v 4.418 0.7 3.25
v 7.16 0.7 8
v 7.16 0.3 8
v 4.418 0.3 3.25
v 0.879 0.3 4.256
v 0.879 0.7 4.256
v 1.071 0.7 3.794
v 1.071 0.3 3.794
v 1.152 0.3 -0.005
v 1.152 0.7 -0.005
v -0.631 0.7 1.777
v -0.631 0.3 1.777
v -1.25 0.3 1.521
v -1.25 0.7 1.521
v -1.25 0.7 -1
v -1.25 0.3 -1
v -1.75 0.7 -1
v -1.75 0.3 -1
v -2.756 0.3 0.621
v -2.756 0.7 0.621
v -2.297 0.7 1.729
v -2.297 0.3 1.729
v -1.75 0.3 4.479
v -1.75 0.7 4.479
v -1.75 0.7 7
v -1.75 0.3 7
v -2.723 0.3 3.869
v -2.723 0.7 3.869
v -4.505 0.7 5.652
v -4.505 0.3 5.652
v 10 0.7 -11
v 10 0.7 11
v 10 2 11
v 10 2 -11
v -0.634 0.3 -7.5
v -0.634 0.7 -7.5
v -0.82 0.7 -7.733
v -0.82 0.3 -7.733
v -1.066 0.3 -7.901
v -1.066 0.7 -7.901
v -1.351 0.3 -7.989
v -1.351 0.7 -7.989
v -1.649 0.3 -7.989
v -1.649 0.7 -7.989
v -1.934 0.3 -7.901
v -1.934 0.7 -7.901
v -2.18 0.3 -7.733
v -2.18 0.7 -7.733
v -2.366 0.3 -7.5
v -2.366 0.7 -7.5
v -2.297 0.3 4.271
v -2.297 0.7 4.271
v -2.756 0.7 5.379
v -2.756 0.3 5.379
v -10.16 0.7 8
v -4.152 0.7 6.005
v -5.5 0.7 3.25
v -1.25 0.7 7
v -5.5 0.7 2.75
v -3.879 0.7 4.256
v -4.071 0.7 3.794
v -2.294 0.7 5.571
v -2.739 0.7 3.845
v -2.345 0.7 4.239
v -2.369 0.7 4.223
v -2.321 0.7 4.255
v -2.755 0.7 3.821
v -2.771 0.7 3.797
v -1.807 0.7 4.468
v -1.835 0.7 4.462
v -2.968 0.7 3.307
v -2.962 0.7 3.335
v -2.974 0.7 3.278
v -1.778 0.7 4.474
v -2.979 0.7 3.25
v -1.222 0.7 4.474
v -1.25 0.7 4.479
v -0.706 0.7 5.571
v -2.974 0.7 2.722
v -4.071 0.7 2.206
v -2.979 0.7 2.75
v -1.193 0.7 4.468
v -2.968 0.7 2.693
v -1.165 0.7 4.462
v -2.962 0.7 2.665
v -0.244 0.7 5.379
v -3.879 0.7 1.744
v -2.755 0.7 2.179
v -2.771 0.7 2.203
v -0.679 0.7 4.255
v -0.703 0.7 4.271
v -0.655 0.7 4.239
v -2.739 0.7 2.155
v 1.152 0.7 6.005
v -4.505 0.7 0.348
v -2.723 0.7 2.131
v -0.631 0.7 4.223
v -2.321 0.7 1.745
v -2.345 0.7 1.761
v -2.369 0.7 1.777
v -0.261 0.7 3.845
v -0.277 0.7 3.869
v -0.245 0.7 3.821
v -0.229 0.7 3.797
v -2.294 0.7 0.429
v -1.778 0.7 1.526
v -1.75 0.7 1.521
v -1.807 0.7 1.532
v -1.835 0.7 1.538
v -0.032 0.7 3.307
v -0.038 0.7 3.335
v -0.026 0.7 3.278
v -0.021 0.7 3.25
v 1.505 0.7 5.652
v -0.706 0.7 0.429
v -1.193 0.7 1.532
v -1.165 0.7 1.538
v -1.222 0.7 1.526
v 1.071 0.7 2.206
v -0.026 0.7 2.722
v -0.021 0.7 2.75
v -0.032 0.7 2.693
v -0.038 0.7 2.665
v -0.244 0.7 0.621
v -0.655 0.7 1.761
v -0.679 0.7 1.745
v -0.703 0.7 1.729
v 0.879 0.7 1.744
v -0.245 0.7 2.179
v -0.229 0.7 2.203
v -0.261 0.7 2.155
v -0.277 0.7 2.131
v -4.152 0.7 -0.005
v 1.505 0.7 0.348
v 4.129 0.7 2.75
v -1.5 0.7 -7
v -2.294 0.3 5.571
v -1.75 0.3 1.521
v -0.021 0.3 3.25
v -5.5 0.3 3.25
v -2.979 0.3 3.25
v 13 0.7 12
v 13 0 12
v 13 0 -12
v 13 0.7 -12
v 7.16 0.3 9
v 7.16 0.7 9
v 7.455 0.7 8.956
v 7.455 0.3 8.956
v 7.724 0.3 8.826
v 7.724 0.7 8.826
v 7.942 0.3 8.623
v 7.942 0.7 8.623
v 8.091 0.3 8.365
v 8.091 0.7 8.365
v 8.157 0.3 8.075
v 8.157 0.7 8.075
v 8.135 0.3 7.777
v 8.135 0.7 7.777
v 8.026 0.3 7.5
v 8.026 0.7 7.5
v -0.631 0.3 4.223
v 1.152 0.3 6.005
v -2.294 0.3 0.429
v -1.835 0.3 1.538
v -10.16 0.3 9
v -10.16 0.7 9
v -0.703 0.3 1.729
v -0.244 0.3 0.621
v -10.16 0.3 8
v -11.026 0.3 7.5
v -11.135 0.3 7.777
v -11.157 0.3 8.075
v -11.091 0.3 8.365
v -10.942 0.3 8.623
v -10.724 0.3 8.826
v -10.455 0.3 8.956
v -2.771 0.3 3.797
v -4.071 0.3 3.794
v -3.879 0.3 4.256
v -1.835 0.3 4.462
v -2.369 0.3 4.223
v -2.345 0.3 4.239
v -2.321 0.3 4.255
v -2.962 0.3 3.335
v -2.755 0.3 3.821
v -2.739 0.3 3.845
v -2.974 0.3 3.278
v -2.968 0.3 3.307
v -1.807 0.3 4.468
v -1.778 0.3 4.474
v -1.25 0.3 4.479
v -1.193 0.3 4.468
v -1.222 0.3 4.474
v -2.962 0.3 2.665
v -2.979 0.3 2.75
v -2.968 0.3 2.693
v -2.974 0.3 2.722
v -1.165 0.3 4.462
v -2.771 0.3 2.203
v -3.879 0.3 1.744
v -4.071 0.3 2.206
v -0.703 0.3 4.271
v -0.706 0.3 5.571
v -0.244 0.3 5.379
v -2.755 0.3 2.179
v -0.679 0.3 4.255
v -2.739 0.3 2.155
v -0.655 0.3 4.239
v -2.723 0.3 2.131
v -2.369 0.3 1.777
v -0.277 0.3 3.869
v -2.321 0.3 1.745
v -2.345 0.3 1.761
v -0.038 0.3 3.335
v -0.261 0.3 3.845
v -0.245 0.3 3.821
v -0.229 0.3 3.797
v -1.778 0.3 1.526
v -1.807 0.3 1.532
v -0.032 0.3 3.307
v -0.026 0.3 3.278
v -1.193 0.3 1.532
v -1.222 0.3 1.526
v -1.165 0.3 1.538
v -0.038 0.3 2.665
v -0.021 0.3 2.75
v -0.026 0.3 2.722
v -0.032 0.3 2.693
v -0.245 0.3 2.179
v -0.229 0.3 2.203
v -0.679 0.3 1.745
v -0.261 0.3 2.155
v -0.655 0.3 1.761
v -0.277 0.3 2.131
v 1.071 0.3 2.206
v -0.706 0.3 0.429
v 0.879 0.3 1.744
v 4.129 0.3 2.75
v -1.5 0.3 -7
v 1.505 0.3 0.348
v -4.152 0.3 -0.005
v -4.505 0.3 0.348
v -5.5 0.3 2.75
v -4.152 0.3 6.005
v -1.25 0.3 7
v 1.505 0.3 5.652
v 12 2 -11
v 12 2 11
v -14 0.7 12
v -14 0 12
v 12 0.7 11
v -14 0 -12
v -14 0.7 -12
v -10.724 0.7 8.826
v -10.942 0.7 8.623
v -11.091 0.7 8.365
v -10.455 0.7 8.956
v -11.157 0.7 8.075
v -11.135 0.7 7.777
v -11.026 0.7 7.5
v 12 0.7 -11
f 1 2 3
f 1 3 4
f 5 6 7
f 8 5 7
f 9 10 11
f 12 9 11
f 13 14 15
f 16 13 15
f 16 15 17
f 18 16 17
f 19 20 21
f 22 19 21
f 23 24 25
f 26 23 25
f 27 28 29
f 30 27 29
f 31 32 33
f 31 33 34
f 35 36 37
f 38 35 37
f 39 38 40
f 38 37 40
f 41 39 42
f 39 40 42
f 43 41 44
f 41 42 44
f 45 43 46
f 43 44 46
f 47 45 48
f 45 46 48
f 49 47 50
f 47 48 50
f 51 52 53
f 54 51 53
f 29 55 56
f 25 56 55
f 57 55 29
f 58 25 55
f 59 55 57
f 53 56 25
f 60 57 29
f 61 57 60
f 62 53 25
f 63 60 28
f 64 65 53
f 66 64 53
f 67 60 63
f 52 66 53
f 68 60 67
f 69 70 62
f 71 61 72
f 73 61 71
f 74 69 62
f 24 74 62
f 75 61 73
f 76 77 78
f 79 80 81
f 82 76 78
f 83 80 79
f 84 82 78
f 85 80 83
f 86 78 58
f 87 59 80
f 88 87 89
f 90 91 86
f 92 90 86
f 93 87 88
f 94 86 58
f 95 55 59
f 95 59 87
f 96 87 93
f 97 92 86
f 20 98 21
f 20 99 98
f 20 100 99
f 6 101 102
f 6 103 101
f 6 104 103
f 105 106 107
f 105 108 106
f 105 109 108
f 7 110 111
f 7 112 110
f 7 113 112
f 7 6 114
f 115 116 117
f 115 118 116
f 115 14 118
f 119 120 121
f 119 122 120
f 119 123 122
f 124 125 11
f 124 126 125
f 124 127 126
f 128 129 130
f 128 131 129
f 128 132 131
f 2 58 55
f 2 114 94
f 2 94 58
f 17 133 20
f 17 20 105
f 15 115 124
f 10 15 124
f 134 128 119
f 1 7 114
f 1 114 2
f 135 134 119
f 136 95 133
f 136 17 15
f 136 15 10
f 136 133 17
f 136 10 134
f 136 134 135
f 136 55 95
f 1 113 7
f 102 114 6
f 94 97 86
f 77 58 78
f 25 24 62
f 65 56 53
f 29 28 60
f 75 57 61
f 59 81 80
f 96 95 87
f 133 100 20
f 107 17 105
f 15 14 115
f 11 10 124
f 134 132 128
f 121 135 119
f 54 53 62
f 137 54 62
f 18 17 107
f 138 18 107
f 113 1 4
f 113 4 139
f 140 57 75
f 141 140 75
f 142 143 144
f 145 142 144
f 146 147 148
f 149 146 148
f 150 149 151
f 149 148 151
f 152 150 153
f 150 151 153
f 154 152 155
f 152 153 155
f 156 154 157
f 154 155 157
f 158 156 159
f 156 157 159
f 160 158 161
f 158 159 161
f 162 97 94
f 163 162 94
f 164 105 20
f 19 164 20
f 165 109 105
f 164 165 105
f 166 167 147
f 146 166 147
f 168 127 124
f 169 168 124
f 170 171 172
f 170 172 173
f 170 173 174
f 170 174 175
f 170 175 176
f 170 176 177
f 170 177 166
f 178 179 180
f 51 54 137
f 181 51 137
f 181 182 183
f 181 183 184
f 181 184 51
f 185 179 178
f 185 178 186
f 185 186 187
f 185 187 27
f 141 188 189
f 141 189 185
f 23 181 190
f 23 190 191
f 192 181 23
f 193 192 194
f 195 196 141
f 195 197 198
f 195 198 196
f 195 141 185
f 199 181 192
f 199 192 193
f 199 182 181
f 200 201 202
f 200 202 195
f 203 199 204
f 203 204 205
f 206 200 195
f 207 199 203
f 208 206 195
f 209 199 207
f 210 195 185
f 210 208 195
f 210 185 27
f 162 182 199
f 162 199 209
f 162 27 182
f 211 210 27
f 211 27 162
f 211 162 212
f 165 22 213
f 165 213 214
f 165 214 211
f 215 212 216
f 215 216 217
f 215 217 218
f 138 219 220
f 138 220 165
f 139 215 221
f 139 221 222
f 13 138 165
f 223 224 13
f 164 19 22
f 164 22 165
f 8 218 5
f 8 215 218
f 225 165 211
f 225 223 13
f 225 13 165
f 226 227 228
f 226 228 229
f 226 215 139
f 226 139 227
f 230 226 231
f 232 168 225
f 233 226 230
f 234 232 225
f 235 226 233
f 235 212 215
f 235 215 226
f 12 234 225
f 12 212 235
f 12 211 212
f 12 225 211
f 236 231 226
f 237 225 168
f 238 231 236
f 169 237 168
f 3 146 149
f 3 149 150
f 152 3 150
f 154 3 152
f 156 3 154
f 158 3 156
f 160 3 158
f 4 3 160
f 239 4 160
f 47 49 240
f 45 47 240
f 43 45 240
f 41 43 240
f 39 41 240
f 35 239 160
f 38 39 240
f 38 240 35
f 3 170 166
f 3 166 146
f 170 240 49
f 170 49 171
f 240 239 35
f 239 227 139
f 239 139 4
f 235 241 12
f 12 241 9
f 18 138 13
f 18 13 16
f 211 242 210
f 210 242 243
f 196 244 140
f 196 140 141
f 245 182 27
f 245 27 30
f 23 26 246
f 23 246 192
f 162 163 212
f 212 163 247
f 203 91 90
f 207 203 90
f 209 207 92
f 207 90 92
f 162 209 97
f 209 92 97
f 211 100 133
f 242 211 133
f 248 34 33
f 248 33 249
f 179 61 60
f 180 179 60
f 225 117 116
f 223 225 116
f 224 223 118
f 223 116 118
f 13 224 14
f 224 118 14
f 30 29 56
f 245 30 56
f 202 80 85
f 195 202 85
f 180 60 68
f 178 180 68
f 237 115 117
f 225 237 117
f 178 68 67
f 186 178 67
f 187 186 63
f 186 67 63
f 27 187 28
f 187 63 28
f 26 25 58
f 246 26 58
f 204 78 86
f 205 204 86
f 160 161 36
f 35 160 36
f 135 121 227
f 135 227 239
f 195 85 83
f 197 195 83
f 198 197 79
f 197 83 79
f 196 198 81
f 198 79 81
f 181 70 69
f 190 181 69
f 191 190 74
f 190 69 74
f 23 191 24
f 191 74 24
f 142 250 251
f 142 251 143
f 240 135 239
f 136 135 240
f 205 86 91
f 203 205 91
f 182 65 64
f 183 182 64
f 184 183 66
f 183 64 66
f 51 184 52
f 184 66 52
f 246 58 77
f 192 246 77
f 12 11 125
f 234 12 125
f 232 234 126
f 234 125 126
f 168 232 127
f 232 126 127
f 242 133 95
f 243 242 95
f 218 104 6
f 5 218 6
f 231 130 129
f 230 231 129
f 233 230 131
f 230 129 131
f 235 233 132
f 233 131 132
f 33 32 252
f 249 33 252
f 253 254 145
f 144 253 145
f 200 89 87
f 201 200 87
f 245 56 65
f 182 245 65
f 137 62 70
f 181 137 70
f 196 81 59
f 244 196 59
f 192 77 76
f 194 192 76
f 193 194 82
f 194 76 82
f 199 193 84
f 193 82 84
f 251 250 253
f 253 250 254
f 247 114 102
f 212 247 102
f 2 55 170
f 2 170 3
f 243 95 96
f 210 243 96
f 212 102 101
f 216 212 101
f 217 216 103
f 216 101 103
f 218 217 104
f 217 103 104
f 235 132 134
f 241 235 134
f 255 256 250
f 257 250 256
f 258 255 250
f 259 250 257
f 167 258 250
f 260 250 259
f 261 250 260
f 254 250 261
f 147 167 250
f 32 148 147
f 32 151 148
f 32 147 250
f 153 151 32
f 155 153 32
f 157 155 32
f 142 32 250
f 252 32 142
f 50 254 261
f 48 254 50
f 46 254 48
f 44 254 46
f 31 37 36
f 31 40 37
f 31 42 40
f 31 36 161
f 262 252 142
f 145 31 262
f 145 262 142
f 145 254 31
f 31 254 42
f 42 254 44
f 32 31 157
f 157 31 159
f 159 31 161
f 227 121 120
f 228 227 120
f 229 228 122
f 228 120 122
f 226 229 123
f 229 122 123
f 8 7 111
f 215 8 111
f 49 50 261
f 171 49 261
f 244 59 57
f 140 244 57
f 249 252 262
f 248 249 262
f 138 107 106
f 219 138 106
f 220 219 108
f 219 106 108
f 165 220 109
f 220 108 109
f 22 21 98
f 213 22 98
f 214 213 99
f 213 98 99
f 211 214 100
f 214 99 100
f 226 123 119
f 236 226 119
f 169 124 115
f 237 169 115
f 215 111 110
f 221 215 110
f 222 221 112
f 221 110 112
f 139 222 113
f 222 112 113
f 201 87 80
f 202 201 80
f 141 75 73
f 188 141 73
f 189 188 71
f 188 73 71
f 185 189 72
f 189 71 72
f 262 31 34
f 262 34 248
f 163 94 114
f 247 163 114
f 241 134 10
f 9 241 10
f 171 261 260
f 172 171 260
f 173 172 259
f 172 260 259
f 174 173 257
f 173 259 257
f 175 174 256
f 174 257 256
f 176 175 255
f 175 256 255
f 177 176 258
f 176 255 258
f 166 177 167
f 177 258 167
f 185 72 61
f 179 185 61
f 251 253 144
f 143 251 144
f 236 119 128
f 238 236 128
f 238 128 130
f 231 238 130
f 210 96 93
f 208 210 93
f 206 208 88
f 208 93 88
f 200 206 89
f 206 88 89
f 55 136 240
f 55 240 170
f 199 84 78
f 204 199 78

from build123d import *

# Parameters (mm, degrees)
SKETCH1_W           = 26
SKETCH1_H           = 24
BOSS_EXTRUDE1_DEPTH = 0.7
SKETCH2_W           = 2
SKETCH2_H           = 22
BOSS_EXTRUDE2_DEPTH = 1.3
CUT_EXTRUDE2_DEPTH  = 0.4
CUT_EXTRUDE3_DEPTH  = 0.4
SKETCH4_W           = 1
SKETCH4_H           = 24
BOSS_EXTRUDE3_DEPTH = 0.7
CUT_EXTRUDE4_DEPTH  = 0.4


with BuildPart() as part:
    # Sketch1 → Boss-Extrude1 (new body)
    with BuildSketch(Plane(origin=(0, 0, 0), x_dir=(1, 0, 0), z_dir=(0, 1, 0))):
        Rectangle(SKETCH1_W, SKETCH1_H)
    extrude(amount=BOSS_EXTRUDE1_DEPTH)

    # Sketch2 → Boss-Extrude2 (add)
    with BuildSketch(Plane(origin=(0, 0.7, 0), x_dir=(1, 0, 0), z_dir=(0, 1, 0))):
        with Locations((11, 0)):
            Rectangle(SKETCH2_W, SKETCH2_H)
    extrude(amount=BOSS_EXTRUDE2_DEPTH)

    # Sketch3 → Cut-Extrude2 (cut)
    with BuildSketch(Plane(origin=(0, 0.7, 0), x_dir=(1, 0, 0), z_dir=(0, 1, 0))):
        with BuildLine():
            Line((-2.366025404, 7.5), (-11.026279442, -7.5))
            ThreePointArc((-11.026279442, -7.5), (-11.026279442, -8.5), (-10.160254038, -9))
            Line((-10.160254038, -9), (7.160254038, -9))
            ThreePointArc((7.160254038, -9), (8.026279442, -8.5), (8.026279442, -7.5))
            Line((8.026279442, -7.5), (-0.633974596, 7.5))
            ThreePointArc((-0.633974596, 7.5), (-1.5, 8), (-2.366025404, 7.5))
        make_face()
        Polygon((7.160254038, -8), (-1.5, 7), (-10.160254038, -8), align=None, mode=Mode.SUBTRACT)
    extrude(amount=-CUT_EXTRUDE2_DEPTH, mode=Mode.SUBTRACT)

    # Sketch5 → Cut-Extrude3 (cut)
    with BuildSketch(Plane(origin=(0, 0.7, 0), x_dir=(1, 0, 0), z_dir=(0, 1, 0))):
        with BuildLine():
            Line((-4.151650429, -6.00520382), (-2.369048338, -4.222601728))
            ThreePointArc((-2.369048338, -4.222601728), (-2.33335535, -4.247204418), (-2.296966313, -4.270765398))
            Line((-2.296966313, -4.270765398), (-2.756186431, -5.379420837))
            Line((-2.756186431, -5.379420837), (-2.294246665, -5.570762553))
            Line((-2.294246665, -5.570762553), (-1.835026546, -4.462107114))
            ThreePointArc((-1.835026546, -4.462107114), (-1.792635483, -4.471177921), (-1.75, -4.479019946))
            Line((-1.75, -4.479019946), (-1.75, -7))
            Line((-1.75, -7), (-1.25, -7))
            Line((-1.25, -7), (-1.25, -4.479019946))
            ThreePointArc((-1.25, -4.479019946), (-1.207364517, -4.471177921), (-1.164973454, -4.462107114))
            Line((-1.164973454, -4.462107114), (-0.705753335, -5.570762553))
            Line((-0.705753335, -5.570762553), (-0.243813569, -5.379420837))
            Line((-0.243813569, -5.379420837), (-0.703033687, -4.270765398))
            ThreePointArc((-0.703033687, -4.270765398), (-0.66664465, -4.247204418), (-0.630951662, -4.222601728))
            Line((-0.630951662, -4.222601728), (1.151650429, -6.00520382))
            Line((1.151650429, -6.00520382), (1.50520382, -5.651650429))
            Line((1.50520382, -5.651650429), (-0.277398272, -3.869048338))
            ThreePointArc((-0.277398272, -3.869048338), (-0.252795582, -3.83335535), (-0.229234602, -3.796966313))
            Line((-0.229234602, -3.796966313), (0.879420837, -4.256186431))
            Line((0.879420837, -4.256186431), (1.070762553, -3.794246665))
            Line((1.070762553, -3.794246665), (-0.037892886, -3.335026546))
            ThreePointArc((-0.037892886, -3.335026546), (-0.028822079, -3.292635483), (-0.020980054, -3.25))
            Line((-0.020980054, -3.25), (2.5, -3.25))
            Line((2.5, -3.25), (2.5, -2.75))
            Line((2.5, -2.75), (-0.020980054, -2.75))
            ThreePointArc((-0.020980054, -2.75), (-0.028822079, -2.707364517), (-0.037892886, -2.664973454))
            Line((-0.037892886, -2.664973454), (1.070762553, -2.205753335))
            Line((1.070762553, -2.205753335), (0.879420837, -1.743813569))
            Line((0.879420837, -1.743813569), (-0.229234602, -2.203033687))
            ThreePointArc((-0.229234602, -2.203033687), (-0.252795582, -2.16664465), (-0.277398272, -2.130951662))
            Line((-0.277398272, -2.130951662), (1.50520382, -0.348349571))
            Line((1.50520382, -0.348349571), (1.151650429, 0.00520382))
            Line((1.151650429, 0.00520382), (-0.630951662, -1.777398272))
            ThreePointArc((-0.630951662, -1.777398272), (-0.66664465, -1.752795582), (-0.703033687, -1.729234602))
            Line((-0.703033687, -1.729234602), (-0.243813569, -0.620579163))
            Line((-0.243813569, -0.620579163), (-0.705753335, -0.429237447))
            Line((-0.705753335, -0.429237447), (-1.164973454, -1.537892886))
            ThreePointArc((-1.164973454, -1.537892886), (-1.207364517, -1.528822079), (-1.25, -1.520980054))
            Line((-1.25, -1.520980054), (-1.25, 1))
            Line((-1.25, 1), (-1.75, 1))
            Line((-1.75, 1), (-1.75, -1.520980054))
            ThreePointArc((-1.75, -1.520980054), (-1.792635483, -1.528822079), (-1.835026546, -1.537892886))
            Line((-1.835026546, -1.537892886), (-2.294246665, -0.429237447))
            Line((-2.294246665, -0.429237447), (-2.756186431, -0.620579163))
            Line((-2.756186431, -0.620579163), (-2.296966313, -1.729234602))
            ThreePointArc((-2.296966313, -1.729234602), (-2.33335535, -1.752795582), (-2.369048338, -1.777398272))
            Line((-2.369048338, -1.777398272), (-4.151650429, 0.00520382))
            Line((-4.151650429, 0.00520382), (-4.50520382, -0.348349571))
            Line((-4.50520382, -0.348349571), (-2.722601728, -2.130951662))
            ThreePointArc((-2.722601728, -2.130951662), (-2.747204418, -2.16664465), (-2.770765398, -2.203033687))
            Line((-2.770765398, -2.203033687), (-3.879420837, -1.743813569))
            Line((-3.879420837, -1.743813569), (-4.070762553, -2.205753335))
            Line((-4.070762553, -2.205753335), (-2.962107114, -2.664973454))
            ThreePointArc((-2.962107114, -2.664973454), (-2.971177921, -2.707364517), (-2.979019946, -2.75))
            Line((-2.979019946, -2.75), (-5.5, -2.75))
            Line((-5.5, -2.75), (-5.5, -3.25))
            Line((-5.5, -3.25), (-2.979019946, -3.25))
            ThreePointArc((-2.979019946, -3.25), (-2.971177921, -3.292635483), (-2.962107114, -3.335026546))
            Line((-2.962107114, -3.335026546), (-4.070762553, -3.794246665))
            Line((-4.070762553, -3.794246665), (-3.879420837, -4.256186431))
            Line((-3.879420837, -4.256186431), (-2.770765398, -3.796966313))
            ThreePointArc((-2.770765398, -3.796966313), (-2.747204418, -3.83335535), (-2.722601728, -3.869048338))
            Line((-2.722601728, -3.869048338), (-4.50520382, -5.651650429))
            Line((-4.50520382, -5.651650429), (-4.151650429, -6.00520382))
        make_face()
    extrude(amount=-CUT_EXTRUDE3_DEPTH, mode=Mode.SUBTRACT)

    # Sketch4 → Boss-Extrude3 (add)
    with BuildSketch(Plane(origin=(0, 0.7, 0), x_dir=(1, 0, 0), z_dir=(0, 1, 0))):
        with Locations((-13.5, 0)):
            Rectangle(SKETCH4_W, SKETCH4_H)
    extrude(amount=-BOSS_EXTRUDE3_DEPTH)

    # Sketch6 → Cut-Extrude4 (cut)
    with BuildSketch(Plane(origin=(0, 0.7, 0), x_dir=(1, 0, 0), z_dir=(0, 1, 0))):
        Polygon((2.5, -2.75), (4.129165125, -2.75), (4.417840259, -3.25), (2.5, -3.25), align=None)
    extrude(amount=-CUT_EXTRUDE4_DEPTH, mode=Mode.SUBTRACT)


solid = part.part
